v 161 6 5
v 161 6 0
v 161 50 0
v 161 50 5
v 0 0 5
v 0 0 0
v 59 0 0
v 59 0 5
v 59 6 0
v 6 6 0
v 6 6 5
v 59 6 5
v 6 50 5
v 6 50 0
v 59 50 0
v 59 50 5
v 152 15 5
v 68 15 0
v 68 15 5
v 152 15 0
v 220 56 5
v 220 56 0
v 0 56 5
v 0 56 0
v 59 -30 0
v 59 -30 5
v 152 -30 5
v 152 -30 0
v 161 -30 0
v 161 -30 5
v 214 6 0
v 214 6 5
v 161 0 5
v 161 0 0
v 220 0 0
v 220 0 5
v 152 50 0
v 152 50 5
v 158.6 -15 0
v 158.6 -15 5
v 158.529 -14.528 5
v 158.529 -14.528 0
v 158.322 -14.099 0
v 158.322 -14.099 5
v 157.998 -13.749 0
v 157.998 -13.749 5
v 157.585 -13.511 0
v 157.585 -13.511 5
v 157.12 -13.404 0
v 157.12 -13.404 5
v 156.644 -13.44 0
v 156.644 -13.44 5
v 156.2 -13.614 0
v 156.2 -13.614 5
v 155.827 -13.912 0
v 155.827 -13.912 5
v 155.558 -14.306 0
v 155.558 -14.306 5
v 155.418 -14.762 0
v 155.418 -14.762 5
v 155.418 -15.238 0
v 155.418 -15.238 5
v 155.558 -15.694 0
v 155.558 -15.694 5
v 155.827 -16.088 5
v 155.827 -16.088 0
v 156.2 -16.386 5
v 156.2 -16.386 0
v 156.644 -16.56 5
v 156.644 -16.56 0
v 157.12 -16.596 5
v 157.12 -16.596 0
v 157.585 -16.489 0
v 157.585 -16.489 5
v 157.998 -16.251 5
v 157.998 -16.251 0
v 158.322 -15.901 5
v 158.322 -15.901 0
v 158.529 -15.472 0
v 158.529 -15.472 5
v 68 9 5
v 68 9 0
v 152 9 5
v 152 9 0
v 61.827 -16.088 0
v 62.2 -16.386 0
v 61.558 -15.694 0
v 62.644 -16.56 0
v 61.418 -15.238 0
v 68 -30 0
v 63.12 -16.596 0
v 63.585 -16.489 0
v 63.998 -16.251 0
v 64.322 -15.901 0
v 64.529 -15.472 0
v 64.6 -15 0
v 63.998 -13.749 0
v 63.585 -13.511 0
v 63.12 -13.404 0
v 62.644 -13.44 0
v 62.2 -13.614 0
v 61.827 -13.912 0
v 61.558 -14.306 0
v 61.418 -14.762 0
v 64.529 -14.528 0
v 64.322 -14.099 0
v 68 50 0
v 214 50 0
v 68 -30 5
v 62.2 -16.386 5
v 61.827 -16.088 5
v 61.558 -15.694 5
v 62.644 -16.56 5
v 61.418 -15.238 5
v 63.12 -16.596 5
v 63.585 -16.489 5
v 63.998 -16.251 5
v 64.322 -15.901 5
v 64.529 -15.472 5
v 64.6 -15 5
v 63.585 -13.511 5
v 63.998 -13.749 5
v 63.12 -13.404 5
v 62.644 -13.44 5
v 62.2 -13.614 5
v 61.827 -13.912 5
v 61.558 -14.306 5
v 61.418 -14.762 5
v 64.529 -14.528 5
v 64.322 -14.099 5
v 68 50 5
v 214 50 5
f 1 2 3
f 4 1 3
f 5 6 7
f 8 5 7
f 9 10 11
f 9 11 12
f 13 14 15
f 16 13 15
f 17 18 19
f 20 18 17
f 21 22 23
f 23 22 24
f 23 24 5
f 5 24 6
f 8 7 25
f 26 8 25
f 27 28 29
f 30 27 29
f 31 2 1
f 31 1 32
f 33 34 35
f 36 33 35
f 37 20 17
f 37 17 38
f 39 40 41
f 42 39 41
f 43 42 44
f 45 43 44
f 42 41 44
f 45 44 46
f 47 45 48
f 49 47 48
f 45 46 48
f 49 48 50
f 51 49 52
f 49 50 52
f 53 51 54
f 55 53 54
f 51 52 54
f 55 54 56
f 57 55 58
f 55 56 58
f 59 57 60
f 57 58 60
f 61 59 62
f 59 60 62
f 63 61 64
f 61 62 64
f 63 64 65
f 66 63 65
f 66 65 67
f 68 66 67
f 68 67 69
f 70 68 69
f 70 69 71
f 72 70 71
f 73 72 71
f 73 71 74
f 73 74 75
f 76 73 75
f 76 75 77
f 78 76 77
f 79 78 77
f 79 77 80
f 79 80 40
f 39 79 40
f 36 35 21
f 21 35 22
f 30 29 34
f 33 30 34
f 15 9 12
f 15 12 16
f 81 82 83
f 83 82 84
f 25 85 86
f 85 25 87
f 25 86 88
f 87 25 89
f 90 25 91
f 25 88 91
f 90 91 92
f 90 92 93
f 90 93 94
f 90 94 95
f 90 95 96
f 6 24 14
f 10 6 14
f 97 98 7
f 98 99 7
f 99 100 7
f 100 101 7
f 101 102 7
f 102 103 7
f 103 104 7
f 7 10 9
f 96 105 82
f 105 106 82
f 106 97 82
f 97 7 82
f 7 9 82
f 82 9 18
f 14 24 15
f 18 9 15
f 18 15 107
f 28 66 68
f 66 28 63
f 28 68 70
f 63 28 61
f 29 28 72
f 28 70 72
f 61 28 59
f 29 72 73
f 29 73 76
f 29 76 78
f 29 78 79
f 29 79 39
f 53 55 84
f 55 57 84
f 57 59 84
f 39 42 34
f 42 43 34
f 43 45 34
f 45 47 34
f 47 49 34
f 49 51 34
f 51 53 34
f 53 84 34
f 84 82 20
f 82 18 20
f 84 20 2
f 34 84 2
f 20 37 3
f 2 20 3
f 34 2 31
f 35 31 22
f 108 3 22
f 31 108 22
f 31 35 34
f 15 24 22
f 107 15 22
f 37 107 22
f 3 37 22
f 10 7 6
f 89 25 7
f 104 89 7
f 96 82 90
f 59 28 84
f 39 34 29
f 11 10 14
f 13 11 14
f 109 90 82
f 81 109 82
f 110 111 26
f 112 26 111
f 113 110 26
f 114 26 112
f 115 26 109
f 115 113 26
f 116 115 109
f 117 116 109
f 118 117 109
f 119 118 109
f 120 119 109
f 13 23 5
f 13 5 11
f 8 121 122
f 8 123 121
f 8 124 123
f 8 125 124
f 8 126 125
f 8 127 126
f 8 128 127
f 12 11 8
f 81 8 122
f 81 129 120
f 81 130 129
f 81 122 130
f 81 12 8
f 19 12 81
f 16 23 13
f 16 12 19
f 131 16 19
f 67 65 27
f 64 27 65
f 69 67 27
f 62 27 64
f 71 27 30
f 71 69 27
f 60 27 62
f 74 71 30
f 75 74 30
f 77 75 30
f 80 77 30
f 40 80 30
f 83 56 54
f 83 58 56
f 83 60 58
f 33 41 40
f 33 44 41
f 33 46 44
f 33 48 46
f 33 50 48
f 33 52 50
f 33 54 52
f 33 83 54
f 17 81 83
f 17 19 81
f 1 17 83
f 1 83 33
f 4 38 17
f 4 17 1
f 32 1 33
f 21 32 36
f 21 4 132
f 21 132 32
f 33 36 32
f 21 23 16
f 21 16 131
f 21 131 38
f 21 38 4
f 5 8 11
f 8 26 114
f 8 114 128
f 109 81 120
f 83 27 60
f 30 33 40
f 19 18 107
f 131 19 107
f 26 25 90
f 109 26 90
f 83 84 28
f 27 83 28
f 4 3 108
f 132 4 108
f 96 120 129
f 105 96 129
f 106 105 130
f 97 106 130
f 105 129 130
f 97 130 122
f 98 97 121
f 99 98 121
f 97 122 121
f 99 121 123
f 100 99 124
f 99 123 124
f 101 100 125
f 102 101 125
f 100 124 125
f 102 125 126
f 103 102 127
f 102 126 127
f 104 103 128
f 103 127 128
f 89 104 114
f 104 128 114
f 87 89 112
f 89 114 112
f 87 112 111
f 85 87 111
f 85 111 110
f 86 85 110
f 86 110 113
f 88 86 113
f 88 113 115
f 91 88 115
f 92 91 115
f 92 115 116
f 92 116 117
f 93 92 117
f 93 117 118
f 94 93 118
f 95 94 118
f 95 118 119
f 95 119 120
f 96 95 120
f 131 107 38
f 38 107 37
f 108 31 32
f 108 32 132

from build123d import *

# Parameters (mm, degrees)
SKETCH_1_W          = 53
SKETCH_1_H          = 44
SKETCH_1_W_2        = 84
SKETCH_1_H_2        = 35
EXTRUDE_1_DEPTH     = 5
SKETCH_2_R          = 1.6
CUT_EXTRUDE_1_DEPTH = 228.070473642


with BuildPart() as part:
    # 草图1 → 凸台-拉伸1 (new body)
    with BuildSketch(Plane.XY):
        Polygon((161, 0), (220, 0), (220, 56), (0, 56), (0, 0), (59, 0), (59, -30), (68, -30), (68, 9), (152, 9), (152, -30), (161, -30), align=None)
        with Locations((32.5, 28)):
            Rectangle(SKETCH_1_W, SKETCH_1_H, mode=Mode.SUBTRACT)
        with Locations((187.5, 28)):
            Rectangle(SKETCH_1_W, SKETCH_1_H, mode=Mode.SUBTRACT)
        with Locations((110, 32.5)):
            Rectangle(SKETCH_1_W_2, SKETCH_1_H_2, mode=Mode.SUBTRACT)
    extrude(amount=EXTRUDE_1_DEPTH)

    # 草图2 → 切除-拉伸1 (cut, through all)
    with BuildSketch(Plane.XY.offset(5)):
        with Locations((63, -15)):
            Circle(SKETCH_2_R)
        with Locations((157, -15)):
            Circle(SKETCH_2_R)
    extrude(amount=-CUT_EXTRUDE_1_DEPTH, mode=Mode.SUBTRACT)


solid = part.part
